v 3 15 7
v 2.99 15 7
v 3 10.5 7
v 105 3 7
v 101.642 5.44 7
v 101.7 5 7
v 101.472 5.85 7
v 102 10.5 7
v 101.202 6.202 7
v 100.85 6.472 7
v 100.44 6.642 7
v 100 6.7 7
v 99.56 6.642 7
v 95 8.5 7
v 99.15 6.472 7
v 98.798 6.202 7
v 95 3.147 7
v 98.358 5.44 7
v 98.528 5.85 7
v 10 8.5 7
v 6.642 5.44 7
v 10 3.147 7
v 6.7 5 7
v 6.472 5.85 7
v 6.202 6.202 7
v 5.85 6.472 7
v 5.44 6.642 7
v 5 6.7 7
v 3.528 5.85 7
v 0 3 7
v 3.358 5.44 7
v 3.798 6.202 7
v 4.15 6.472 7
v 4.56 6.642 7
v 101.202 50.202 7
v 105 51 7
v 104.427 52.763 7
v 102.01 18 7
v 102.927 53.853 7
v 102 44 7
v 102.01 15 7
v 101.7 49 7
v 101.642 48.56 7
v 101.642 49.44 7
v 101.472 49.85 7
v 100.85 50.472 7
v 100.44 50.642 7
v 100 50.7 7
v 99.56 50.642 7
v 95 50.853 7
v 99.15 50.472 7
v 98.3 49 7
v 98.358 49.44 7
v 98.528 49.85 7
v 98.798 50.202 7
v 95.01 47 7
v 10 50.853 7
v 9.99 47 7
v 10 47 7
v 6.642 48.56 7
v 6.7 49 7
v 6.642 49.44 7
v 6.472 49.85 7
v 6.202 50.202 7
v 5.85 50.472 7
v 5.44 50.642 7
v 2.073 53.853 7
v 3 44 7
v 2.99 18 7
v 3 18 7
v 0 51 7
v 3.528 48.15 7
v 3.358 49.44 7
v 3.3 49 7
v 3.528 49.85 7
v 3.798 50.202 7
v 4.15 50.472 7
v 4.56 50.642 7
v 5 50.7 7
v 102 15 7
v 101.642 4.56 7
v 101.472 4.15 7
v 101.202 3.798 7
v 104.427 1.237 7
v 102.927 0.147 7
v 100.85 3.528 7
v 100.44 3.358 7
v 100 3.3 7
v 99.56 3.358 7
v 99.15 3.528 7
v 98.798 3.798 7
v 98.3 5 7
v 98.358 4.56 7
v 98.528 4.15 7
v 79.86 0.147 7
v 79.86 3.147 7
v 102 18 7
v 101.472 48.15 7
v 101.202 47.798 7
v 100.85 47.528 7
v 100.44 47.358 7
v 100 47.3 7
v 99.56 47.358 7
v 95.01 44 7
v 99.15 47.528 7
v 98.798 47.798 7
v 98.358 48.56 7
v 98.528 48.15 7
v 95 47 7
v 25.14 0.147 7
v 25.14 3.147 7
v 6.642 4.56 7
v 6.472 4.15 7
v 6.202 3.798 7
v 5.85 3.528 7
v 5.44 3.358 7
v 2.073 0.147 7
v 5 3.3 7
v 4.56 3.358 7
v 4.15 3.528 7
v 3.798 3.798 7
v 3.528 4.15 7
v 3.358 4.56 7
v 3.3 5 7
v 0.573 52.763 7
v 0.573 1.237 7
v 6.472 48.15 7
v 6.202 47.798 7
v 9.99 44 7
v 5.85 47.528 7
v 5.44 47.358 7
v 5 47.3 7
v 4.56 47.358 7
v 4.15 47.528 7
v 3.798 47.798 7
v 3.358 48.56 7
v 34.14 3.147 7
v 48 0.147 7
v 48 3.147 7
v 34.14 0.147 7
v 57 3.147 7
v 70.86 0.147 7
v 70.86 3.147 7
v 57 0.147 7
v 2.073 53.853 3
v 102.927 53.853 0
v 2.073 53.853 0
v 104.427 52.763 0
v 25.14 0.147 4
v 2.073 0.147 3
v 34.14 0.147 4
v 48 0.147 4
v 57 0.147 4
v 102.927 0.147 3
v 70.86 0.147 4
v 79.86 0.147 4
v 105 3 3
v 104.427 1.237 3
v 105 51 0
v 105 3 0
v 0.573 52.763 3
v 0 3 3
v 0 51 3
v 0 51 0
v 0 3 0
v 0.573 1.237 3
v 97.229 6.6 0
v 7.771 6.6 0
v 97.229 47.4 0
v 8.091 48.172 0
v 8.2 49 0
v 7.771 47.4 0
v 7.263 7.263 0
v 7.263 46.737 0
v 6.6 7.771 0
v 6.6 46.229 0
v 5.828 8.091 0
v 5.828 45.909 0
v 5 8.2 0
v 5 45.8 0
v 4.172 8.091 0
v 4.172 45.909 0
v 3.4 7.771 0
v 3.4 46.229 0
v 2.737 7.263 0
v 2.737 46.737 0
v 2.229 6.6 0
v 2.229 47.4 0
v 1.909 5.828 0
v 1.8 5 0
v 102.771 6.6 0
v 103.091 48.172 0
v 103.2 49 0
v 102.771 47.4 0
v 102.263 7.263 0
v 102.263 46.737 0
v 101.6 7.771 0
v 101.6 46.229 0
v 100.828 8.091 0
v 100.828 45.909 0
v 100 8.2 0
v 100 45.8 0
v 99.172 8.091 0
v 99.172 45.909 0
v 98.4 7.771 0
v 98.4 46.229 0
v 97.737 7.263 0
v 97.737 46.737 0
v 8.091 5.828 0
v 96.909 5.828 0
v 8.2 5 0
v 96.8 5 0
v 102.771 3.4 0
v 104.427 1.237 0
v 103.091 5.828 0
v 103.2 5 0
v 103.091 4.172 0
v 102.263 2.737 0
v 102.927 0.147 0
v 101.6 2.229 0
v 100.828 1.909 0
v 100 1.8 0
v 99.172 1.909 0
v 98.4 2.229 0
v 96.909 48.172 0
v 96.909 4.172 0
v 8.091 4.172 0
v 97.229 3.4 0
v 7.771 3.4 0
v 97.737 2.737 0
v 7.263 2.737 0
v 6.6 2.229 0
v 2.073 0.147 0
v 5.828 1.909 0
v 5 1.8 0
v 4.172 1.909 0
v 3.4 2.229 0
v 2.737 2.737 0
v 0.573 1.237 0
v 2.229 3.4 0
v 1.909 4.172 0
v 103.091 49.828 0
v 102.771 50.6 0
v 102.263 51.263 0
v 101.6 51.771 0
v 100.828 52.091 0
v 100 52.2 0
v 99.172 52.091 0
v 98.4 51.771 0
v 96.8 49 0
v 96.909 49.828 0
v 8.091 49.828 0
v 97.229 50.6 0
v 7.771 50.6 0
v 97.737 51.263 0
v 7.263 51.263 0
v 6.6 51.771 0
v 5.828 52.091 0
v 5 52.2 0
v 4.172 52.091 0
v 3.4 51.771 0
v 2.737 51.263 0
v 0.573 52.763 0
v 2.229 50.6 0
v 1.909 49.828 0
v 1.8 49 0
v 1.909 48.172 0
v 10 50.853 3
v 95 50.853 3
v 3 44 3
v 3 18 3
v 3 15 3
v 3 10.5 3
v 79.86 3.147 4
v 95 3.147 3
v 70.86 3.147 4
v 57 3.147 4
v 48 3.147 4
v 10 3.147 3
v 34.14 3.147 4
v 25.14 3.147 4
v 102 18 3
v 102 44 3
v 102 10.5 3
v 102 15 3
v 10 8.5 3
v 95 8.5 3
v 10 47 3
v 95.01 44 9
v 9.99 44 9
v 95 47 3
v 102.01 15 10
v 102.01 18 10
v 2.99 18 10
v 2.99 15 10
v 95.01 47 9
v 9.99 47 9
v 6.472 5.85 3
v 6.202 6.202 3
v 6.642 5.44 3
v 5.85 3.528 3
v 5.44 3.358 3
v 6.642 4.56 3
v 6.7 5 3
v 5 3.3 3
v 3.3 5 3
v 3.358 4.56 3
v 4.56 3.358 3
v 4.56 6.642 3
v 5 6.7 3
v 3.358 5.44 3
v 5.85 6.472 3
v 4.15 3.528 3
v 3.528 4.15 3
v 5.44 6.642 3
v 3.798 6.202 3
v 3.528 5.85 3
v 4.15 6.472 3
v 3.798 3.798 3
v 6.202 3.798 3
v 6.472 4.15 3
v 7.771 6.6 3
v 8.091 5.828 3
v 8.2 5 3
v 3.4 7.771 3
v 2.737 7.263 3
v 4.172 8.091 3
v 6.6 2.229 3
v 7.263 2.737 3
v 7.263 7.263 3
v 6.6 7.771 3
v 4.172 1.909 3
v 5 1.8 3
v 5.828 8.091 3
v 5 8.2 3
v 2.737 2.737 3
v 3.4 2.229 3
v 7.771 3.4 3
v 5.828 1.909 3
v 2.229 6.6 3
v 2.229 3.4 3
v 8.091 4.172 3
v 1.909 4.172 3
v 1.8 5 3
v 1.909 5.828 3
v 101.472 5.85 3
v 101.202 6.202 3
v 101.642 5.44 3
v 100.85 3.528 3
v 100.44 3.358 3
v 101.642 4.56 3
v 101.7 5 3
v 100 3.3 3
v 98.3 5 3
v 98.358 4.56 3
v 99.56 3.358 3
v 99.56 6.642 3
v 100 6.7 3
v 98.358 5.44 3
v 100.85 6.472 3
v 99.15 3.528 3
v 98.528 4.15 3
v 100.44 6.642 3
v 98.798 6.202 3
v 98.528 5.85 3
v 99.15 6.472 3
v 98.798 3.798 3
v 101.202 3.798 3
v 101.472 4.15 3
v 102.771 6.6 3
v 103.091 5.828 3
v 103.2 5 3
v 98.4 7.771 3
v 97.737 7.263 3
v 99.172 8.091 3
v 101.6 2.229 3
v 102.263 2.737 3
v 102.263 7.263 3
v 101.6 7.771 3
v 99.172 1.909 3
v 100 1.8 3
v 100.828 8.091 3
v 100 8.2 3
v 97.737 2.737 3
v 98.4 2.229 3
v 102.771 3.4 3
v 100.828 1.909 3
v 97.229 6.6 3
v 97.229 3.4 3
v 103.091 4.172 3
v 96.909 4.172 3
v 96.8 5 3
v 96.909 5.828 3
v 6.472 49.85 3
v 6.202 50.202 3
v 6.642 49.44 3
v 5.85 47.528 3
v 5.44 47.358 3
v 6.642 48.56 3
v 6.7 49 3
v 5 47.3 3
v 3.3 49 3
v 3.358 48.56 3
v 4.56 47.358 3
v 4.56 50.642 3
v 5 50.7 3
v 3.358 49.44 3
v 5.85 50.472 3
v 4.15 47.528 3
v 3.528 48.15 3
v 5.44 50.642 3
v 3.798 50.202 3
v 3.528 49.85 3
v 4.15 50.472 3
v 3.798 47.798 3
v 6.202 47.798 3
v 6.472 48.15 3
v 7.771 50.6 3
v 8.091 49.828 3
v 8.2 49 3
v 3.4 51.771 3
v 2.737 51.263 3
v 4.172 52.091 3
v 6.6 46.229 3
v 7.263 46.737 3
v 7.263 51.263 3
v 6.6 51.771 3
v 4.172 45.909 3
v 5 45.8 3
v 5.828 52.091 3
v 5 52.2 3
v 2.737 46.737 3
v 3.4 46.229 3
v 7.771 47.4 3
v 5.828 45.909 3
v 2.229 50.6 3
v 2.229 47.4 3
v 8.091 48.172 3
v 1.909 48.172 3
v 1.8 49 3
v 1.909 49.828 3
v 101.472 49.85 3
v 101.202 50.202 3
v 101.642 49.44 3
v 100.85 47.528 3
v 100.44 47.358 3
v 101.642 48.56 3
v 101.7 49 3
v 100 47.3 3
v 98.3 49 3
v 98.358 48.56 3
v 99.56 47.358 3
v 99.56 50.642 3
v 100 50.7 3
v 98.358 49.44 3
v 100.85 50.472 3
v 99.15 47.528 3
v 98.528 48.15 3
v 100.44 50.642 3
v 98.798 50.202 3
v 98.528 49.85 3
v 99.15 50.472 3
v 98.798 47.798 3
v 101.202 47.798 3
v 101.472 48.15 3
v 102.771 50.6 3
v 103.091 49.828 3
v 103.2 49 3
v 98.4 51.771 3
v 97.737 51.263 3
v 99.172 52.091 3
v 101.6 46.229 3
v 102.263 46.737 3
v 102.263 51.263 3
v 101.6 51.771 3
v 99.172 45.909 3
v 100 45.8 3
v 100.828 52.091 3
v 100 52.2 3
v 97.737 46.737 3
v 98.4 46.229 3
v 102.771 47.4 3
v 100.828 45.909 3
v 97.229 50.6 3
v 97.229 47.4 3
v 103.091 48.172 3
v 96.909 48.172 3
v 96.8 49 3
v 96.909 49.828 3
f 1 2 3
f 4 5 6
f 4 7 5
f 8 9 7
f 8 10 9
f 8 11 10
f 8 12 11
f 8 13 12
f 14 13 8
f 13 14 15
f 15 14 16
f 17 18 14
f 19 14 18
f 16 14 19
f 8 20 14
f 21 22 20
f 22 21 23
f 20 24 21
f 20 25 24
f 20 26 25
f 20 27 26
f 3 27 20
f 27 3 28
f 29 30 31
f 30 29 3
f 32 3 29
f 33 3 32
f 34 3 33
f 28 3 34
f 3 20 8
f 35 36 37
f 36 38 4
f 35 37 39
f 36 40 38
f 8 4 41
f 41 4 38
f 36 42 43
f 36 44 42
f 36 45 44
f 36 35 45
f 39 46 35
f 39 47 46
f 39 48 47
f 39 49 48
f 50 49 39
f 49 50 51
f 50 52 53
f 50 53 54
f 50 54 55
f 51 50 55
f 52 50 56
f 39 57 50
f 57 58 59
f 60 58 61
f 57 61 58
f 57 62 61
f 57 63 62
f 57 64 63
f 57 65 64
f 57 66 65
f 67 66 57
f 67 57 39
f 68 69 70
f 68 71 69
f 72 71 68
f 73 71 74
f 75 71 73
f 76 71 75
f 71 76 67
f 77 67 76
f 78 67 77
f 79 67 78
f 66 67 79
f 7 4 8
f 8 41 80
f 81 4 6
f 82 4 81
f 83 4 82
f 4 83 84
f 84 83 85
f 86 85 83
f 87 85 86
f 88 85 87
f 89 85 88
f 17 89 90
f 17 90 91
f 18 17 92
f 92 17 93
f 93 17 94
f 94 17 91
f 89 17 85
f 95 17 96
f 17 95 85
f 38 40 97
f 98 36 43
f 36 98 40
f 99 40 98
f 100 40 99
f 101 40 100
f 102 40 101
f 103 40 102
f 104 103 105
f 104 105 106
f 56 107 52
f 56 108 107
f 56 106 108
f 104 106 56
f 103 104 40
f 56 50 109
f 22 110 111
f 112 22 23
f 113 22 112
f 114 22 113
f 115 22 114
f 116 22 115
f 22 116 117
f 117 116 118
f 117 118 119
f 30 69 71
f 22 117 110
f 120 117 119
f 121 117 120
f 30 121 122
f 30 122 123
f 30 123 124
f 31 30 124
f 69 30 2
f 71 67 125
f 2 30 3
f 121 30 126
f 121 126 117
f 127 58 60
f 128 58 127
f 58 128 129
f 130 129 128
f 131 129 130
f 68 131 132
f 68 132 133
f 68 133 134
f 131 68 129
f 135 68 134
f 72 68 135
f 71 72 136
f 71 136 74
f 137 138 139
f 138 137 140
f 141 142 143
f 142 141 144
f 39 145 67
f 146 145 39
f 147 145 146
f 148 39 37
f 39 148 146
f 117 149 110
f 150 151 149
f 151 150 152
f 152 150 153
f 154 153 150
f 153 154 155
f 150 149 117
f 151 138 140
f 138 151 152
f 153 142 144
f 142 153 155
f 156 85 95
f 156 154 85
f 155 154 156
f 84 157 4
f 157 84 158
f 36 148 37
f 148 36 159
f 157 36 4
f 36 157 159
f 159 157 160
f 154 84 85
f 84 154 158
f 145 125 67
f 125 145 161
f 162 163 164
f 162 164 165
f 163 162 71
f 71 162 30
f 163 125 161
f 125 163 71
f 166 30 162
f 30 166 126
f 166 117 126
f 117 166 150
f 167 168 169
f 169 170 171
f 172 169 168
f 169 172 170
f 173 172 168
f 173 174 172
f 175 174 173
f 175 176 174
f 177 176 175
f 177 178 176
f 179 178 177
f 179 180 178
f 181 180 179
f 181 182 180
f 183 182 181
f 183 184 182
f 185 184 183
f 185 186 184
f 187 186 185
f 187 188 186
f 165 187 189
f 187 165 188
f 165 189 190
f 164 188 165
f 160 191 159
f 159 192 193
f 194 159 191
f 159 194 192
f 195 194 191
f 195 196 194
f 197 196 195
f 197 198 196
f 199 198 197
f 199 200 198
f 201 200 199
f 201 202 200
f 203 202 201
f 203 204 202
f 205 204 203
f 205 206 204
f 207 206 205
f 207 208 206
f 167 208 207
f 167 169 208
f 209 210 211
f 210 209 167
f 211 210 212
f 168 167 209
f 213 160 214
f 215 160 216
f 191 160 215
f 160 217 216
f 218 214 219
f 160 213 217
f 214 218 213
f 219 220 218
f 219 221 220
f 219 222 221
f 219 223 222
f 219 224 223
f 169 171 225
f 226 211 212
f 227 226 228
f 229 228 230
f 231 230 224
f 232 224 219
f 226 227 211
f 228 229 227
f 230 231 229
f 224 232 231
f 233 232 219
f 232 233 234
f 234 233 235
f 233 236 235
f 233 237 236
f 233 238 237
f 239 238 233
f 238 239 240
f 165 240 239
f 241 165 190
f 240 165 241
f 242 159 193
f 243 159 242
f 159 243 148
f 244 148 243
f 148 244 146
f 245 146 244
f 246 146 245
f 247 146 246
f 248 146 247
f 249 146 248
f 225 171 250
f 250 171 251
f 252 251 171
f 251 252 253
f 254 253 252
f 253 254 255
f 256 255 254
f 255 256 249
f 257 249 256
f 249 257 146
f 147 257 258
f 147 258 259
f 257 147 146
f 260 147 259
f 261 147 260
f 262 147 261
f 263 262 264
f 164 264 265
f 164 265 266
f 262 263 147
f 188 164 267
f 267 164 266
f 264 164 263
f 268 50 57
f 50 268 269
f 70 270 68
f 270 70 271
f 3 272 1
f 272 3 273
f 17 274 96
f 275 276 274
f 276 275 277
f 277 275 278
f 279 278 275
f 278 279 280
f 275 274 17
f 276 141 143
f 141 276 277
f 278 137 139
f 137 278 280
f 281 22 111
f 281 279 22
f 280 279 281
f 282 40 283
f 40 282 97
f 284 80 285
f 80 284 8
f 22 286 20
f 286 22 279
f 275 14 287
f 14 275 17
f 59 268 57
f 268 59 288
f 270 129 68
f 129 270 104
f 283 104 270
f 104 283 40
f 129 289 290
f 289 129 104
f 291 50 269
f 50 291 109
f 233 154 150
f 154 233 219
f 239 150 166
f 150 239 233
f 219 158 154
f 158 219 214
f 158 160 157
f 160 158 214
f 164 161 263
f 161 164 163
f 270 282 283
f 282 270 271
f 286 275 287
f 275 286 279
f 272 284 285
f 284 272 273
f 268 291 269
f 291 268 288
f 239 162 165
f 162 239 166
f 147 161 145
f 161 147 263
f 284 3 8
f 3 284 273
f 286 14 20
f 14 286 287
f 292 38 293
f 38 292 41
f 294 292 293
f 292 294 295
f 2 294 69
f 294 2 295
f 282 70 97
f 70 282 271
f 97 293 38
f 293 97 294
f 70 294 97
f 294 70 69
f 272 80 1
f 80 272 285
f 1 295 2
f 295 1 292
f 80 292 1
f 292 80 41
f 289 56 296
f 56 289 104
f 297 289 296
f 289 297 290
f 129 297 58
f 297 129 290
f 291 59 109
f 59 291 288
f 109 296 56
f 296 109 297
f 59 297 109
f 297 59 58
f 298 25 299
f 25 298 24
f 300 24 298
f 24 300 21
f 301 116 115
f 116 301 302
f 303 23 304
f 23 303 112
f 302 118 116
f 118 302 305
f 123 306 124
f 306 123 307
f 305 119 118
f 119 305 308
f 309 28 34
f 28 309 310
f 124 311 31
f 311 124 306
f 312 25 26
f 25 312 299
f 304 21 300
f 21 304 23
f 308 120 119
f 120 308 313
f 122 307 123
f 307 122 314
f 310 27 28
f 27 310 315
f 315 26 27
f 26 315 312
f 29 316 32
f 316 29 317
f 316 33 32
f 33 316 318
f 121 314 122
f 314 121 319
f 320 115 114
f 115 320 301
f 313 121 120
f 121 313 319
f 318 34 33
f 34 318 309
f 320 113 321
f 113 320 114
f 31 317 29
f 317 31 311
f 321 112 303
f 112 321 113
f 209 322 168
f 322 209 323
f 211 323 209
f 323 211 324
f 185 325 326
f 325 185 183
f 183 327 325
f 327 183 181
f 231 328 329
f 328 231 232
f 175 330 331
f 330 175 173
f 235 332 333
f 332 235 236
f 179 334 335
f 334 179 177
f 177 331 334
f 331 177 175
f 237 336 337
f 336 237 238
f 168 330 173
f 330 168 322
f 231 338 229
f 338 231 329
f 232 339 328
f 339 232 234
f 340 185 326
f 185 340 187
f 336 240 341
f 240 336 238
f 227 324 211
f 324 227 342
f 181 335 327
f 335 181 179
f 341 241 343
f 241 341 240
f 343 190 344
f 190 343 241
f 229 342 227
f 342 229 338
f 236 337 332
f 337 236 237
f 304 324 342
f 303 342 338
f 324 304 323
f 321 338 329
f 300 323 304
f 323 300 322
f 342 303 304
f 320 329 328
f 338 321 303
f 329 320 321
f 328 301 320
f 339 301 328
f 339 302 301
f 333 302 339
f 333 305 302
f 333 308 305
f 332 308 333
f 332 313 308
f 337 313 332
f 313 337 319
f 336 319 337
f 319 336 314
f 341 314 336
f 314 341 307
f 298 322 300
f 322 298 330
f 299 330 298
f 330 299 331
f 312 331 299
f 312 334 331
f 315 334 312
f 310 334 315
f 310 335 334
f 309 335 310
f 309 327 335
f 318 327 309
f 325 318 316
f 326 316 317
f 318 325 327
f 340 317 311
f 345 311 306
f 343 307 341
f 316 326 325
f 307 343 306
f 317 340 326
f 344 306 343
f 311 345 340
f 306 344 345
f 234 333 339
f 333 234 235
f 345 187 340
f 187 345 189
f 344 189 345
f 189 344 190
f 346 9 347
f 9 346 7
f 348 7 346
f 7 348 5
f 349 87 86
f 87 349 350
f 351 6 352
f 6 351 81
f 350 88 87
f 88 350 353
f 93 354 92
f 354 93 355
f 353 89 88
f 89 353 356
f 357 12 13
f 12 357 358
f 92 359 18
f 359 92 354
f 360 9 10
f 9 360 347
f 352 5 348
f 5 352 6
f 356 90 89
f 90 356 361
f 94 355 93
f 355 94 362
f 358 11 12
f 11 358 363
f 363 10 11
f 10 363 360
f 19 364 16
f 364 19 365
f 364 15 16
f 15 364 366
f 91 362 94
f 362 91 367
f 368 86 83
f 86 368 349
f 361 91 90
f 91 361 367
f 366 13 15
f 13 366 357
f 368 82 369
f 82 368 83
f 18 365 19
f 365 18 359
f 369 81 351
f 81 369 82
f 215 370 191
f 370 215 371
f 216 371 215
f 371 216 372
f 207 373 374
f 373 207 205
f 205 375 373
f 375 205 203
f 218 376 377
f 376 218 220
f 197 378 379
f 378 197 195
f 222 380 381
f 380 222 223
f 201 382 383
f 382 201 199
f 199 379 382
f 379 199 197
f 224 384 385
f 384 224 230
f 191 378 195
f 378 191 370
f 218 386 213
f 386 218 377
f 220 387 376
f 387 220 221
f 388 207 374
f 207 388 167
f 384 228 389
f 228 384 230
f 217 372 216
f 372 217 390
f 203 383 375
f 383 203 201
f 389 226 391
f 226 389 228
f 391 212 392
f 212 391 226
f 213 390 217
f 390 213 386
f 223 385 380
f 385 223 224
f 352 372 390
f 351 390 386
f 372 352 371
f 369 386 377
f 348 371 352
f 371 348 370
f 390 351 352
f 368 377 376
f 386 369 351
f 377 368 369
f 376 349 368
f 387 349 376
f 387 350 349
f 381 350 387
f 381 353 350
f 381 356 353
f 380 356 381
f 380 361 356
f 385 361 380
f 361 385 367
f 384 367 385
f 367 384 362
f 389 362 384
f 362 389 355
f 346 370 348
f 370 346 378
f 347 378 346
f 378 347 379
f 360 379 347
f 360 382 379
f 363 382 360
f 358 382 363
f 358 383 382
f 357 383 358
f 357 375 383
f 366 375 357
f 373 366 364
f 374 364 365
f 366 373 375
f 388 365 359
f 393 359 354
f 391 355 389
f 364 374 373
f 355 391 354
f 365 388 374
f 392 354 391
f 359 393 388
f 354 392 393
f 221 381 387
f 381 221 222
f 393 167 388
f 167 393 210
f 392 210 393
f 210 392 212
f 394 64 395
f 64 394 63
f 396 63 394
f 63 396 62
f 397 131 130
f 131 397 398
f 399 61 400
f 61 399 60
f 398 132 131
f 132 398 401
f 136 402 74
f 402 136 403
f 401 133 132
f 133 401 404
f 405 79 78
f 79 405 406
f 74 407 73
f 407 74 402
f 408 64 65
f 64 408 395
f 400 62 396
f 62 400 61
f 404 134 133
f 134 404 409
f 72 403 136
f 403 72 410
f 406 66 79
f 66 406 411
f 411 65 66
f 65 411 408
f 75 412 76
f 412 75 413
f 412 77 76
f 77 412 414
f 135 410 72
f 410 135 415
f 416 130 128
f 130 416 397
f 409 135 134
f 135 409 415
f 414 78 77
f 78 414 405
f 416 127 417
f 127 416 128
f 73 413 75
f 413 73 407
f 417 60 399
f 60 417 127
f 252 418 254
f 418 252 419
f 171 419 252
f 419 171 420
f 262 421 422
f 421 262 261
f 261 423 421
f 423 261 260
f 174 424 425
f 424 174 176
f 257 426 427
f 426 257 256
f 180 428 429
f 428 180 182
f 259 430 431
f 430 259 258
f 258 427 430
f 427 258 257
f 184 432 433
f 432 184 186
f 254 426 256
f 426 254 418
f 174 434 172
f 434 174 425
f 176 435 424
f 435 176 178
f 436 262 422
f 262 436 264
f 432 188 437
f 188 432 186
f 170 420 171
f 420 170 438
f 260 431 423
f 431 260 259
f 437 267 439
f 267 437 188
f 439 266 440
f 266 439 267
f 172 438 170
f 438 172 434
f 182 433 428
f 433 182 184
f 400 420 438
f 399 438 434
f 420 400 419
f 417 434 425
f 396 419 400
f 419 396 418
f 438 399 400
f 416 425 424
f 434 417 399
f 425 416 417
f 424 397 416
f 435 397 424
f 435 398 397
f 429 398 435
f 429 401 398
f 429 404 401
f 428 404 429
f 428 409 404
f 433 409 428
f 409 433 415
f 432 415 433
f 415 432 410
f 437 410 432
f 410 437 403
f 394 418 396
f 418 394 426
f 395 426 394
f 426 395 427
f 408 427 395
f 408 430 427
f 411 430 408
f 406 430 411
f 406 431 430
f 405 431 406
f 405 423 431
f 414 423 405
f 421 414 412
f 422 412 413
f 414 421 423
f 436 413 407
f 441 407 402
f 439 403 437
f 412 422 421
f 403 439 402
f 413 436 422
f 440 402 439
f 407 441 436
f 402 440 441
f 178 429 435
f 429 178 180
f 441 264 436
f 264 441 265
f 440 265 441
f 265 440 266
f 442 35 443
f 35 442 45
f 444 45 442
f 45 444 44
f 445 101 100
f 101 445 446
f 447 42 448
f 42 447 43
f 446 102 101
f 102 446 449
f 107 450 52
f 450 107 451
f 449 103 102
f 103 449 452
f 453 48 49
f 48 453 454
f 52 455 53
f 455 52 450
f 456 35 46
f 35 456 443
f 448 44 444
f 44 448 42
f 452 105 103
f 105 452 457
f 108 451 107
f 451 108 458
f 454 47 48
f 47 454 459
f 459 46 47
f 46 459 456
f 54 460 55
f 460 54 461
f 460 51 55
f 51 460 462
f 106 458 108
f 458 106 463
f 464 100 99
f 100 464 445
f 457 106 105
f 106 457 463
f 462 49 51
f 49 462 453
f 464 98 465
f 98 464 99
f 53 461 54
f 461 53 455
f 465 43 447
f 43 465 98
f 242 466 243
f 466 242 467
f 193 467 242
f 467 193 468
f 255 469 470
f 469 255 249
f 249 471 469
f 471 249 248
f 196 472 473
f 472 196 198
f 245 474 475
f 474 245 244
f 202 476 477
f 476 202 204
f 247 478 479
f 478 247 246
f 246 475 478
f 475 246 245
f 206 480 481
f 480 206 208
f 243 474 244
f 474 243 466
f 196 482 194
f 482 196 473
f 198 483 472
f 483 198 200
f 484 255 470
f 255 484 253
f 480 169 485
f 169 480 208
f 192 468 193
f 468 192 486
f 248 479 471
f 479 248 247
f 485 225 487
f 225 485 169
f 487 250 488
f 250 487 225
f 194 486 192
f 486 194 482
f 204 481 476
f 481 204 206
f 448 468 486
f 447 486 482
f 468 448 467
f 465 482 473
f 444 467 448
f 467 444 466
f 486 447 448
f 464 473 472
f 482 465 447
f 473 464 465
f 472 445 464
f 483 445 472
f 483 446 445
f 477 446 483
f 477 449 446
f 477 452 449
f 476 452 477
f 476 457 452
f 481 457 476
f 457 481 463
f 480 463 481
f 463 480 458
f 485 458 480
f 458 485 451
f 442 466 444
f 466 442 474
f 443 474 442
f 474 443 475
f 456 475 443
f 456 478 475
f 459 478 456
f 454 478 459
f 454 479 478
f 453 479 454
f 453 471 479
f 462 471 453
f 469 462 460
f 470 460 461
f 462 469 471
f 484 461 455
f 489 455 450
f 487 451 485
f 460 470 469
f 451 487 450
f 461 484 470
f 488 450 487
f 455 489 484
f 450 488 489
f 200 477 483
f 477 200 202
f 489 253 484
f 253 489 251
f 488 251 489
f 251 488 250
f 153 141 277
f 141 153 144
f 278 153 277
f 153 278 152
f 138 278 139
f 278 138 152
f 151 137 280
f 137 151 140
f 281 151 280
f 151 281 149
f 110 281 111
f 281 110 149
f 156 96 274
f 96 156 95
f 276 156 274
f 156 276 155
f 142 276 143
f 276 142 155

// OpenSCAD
// file: pillar-all.scad
// Box for microusb power breakout.

// Copyright (C) 2016 Embecosm Limited (www.embecosm.com)

// Contributor: Jeremy Bennett <jeremy.bennett@embecosm.com>

// This file is licensed under the Creative Commons Attribution-ShareAlike 3.0
// Unported License. To view a copy of this license, visit
// http://creativecommons.org/licenses/by-sa/3.0/ or send a letter to Creative
// Commons, PO Box 1866, Mountain View, CA 94042, USA.


// A container for a circuit board containing microusb power breakout. This is
// commond code and definitions.

DELTA = 0.01;
PILLAR = 10;
WALL = 3;
PCB_X = 85 + (PILLAR - WALL) * 2;
PCB_Y = 48;
H = 23;
BASE_H = 13;
TOP_H = H - BASE_H - WALL * 2;
USB_W = 9;
USB_H = 3;
WIRE_W = 3 * 2.54;
WIRE_H = 2;
M3_R = 1.7;
M3_HEAD_R = 3.2;
M3_HEAD_H = 3;
M3_NUT_H = 2.5;

module round_cube (x, y, z) {
    hull () {
        translate (v = [-x/2 + 3, -y/2 + 3, 0])
            cylinder (r = 3, h = z, center = true);
        translate (v = [ x/2 - 3, -y/2 + 3, 0])
            cylinder (r = 3, h = z, center = true);
        translate (v = [-x/2 + 3,  y/2 - 3, 0])
            cylinder (r = 3, h = z, center = true);
        translate (v = [ x/2 - 3,  y/2 - 3, 0])
            cylinder (r = 3, h = z, center = true);
        }
}
// main file
// Box for microusb power breakout.

// Copyright (C) 2016 Embecosm Limited (www.embecosm.com)

// Contributor: Jeremy Bennett <jeremy.bennett@embecosm.com>

// This file is licensed under the Creative Commons Attribution-ShareAlike 3.0
// Unported License. To view a copy of this license, visit
// http://creativecommons.org/licenses/by-sa/3.0/ or send a letter to Creative
// Commons, PO Box 1866, Mountain View, CA 94042, USA.


// A container for a circuit board containing microusb power breakout. This is
// the lid.

include <pillar-all.scad>

module sides () {
    translate (v = [PCB_X / 2 + WALL, PCB_Y / 2 + WALL, (TOP_H + WALL) / 2])
        difference () {
            round_cube (PCB_X + WALL * 2, PCB_Y + WALL * 2, TOP_H + WALL);
            round_cube (PCB_X, PCB_Y, TOP_H + WALL + DELTA);
        }
}

module base () {
    translate (v = [PCB_X / 2 + WALL, PCB_Y / 2 + WALL, WALL / 2])
        round_cube (PCB_X + WALL * 2, PCB_Y + WALL * 2, WALL);
}

module pillars () {
    translate (v = [WALL, WALL, WALL - DELTA])
        cube (size = [PILLAR - WALL, PILLAR - WALL, TOP_H + DELTA],
              center = false);
    translate (v = [WALL * 2 + PCB_X - PILLAR, WALL, WALL - DELTA])
        cube (size = [PILLAR - WALL, PILLAR - WALL, TOP_H + DELTA],
              center = false);
    translate (v = [WALL, WALL * 2 + PCB_Y - PILLAR, WALL - DELTA])
        cube (size = [PILLAR - WALL, PILLAR - WALL, TOP_H + DELTA],
              center = false);
    translate (v = [WALL * 2 + PCB_X - PILLAR,
                    WALL * 2 + PCB_Y - PILLAR, WALL - DELTA])
        cube (size = [PILLAR - WALL, PILLAR - WALL, TOP_H + DELTA],
              center = false);
}

module usb_clamp () {
    translate (v = [WALL - DELTA, WALL + 5.5, WALL - DELTA])
        cube (size = [PCB_X + DELTA * 2, 2, TOP_H + DELTA], center = false);
}

module board_clamp () {
    translate (v = [WALL - DELTA, WALL + 12, WALL - DELTA])
        cube (size = [PCB_X + DELTA * 2, 3, TOP_H + 3 + DELTA], center = false);
}

module wire_clamp () {
    translate (v = [PILLAR - DELTA, WALL + PCB_Y - 7, WALL - DELTA])
        cube (size = [PCB_X - (PILLAR -WALL) * 2 + DELTA * 2, 3,
  	              TOP_H + 2 + DELTA], center = false);
}

module hole () {
    union () {
        cylinder (h = WALL + BASE_H + DELTA * 2, r = M3_R, $fn = 24,
                  center = false);
        cylinder (h = M3_HEAD_H + DELTA, r = M3_HEAD_R, $fn = 24,
                  center = false);
    }
}

module holes () {
    union () {
        translate (v = [PILLAR / 2, PILLAR / 2, -DELTA])
            hole ();
        translate (v = [WALL * 2 + PCB_X - PILLAR / 2, PILLAR / 2, -DELTA])
            hole ();
        translate (v = [PILLAR / 2, WALL * 2 + PCB_Y - PILLAR / 2, -DELTA])
            hole ();
        translate (v = [WALL * 2 + PCB_X - PILLAR / 2,
                        WALL * 2+ PCB_Y - PILLAR / 2, -DELTA])
            hole ();
    }
}

module usb_hole () {
    cube (size = [USB_W, WALL * 2, USB_H + DELTA], center = false);
}

module usb_holes () {
    translate (v = [PCB_X / 2 + WALL - USB_W / 2,
                    -WALL/2, WALL + TOP_H - USB_H])
        usb_hole ();
    // others are 9 .1" holes to the left and the right
    translate (v = [PCB_X / 2 + WALL - USB_W / 2 - 9 * 2.54,
                    -WALL/2, WALL + TOP_H - USB_H])
        usb_hole ();
    translate (v = [PCB_X / 2 + WALL - USB_W / 2 + 9 * 2.54,
                    -WALL/2, WALL + TOP_H - USB_H])
        usb_hole ();
}

module power_lid_base () {
    union () {
        sides ();
        base ();
        pillars ();
	usb_clamp ();
	board_clamp ();
	wire_clamp ();
    }
}

module power_lid () {
    difference () {
        power_lid_base ();
        holes ();
        usb_holes ();
    }
}

power_lid ();
